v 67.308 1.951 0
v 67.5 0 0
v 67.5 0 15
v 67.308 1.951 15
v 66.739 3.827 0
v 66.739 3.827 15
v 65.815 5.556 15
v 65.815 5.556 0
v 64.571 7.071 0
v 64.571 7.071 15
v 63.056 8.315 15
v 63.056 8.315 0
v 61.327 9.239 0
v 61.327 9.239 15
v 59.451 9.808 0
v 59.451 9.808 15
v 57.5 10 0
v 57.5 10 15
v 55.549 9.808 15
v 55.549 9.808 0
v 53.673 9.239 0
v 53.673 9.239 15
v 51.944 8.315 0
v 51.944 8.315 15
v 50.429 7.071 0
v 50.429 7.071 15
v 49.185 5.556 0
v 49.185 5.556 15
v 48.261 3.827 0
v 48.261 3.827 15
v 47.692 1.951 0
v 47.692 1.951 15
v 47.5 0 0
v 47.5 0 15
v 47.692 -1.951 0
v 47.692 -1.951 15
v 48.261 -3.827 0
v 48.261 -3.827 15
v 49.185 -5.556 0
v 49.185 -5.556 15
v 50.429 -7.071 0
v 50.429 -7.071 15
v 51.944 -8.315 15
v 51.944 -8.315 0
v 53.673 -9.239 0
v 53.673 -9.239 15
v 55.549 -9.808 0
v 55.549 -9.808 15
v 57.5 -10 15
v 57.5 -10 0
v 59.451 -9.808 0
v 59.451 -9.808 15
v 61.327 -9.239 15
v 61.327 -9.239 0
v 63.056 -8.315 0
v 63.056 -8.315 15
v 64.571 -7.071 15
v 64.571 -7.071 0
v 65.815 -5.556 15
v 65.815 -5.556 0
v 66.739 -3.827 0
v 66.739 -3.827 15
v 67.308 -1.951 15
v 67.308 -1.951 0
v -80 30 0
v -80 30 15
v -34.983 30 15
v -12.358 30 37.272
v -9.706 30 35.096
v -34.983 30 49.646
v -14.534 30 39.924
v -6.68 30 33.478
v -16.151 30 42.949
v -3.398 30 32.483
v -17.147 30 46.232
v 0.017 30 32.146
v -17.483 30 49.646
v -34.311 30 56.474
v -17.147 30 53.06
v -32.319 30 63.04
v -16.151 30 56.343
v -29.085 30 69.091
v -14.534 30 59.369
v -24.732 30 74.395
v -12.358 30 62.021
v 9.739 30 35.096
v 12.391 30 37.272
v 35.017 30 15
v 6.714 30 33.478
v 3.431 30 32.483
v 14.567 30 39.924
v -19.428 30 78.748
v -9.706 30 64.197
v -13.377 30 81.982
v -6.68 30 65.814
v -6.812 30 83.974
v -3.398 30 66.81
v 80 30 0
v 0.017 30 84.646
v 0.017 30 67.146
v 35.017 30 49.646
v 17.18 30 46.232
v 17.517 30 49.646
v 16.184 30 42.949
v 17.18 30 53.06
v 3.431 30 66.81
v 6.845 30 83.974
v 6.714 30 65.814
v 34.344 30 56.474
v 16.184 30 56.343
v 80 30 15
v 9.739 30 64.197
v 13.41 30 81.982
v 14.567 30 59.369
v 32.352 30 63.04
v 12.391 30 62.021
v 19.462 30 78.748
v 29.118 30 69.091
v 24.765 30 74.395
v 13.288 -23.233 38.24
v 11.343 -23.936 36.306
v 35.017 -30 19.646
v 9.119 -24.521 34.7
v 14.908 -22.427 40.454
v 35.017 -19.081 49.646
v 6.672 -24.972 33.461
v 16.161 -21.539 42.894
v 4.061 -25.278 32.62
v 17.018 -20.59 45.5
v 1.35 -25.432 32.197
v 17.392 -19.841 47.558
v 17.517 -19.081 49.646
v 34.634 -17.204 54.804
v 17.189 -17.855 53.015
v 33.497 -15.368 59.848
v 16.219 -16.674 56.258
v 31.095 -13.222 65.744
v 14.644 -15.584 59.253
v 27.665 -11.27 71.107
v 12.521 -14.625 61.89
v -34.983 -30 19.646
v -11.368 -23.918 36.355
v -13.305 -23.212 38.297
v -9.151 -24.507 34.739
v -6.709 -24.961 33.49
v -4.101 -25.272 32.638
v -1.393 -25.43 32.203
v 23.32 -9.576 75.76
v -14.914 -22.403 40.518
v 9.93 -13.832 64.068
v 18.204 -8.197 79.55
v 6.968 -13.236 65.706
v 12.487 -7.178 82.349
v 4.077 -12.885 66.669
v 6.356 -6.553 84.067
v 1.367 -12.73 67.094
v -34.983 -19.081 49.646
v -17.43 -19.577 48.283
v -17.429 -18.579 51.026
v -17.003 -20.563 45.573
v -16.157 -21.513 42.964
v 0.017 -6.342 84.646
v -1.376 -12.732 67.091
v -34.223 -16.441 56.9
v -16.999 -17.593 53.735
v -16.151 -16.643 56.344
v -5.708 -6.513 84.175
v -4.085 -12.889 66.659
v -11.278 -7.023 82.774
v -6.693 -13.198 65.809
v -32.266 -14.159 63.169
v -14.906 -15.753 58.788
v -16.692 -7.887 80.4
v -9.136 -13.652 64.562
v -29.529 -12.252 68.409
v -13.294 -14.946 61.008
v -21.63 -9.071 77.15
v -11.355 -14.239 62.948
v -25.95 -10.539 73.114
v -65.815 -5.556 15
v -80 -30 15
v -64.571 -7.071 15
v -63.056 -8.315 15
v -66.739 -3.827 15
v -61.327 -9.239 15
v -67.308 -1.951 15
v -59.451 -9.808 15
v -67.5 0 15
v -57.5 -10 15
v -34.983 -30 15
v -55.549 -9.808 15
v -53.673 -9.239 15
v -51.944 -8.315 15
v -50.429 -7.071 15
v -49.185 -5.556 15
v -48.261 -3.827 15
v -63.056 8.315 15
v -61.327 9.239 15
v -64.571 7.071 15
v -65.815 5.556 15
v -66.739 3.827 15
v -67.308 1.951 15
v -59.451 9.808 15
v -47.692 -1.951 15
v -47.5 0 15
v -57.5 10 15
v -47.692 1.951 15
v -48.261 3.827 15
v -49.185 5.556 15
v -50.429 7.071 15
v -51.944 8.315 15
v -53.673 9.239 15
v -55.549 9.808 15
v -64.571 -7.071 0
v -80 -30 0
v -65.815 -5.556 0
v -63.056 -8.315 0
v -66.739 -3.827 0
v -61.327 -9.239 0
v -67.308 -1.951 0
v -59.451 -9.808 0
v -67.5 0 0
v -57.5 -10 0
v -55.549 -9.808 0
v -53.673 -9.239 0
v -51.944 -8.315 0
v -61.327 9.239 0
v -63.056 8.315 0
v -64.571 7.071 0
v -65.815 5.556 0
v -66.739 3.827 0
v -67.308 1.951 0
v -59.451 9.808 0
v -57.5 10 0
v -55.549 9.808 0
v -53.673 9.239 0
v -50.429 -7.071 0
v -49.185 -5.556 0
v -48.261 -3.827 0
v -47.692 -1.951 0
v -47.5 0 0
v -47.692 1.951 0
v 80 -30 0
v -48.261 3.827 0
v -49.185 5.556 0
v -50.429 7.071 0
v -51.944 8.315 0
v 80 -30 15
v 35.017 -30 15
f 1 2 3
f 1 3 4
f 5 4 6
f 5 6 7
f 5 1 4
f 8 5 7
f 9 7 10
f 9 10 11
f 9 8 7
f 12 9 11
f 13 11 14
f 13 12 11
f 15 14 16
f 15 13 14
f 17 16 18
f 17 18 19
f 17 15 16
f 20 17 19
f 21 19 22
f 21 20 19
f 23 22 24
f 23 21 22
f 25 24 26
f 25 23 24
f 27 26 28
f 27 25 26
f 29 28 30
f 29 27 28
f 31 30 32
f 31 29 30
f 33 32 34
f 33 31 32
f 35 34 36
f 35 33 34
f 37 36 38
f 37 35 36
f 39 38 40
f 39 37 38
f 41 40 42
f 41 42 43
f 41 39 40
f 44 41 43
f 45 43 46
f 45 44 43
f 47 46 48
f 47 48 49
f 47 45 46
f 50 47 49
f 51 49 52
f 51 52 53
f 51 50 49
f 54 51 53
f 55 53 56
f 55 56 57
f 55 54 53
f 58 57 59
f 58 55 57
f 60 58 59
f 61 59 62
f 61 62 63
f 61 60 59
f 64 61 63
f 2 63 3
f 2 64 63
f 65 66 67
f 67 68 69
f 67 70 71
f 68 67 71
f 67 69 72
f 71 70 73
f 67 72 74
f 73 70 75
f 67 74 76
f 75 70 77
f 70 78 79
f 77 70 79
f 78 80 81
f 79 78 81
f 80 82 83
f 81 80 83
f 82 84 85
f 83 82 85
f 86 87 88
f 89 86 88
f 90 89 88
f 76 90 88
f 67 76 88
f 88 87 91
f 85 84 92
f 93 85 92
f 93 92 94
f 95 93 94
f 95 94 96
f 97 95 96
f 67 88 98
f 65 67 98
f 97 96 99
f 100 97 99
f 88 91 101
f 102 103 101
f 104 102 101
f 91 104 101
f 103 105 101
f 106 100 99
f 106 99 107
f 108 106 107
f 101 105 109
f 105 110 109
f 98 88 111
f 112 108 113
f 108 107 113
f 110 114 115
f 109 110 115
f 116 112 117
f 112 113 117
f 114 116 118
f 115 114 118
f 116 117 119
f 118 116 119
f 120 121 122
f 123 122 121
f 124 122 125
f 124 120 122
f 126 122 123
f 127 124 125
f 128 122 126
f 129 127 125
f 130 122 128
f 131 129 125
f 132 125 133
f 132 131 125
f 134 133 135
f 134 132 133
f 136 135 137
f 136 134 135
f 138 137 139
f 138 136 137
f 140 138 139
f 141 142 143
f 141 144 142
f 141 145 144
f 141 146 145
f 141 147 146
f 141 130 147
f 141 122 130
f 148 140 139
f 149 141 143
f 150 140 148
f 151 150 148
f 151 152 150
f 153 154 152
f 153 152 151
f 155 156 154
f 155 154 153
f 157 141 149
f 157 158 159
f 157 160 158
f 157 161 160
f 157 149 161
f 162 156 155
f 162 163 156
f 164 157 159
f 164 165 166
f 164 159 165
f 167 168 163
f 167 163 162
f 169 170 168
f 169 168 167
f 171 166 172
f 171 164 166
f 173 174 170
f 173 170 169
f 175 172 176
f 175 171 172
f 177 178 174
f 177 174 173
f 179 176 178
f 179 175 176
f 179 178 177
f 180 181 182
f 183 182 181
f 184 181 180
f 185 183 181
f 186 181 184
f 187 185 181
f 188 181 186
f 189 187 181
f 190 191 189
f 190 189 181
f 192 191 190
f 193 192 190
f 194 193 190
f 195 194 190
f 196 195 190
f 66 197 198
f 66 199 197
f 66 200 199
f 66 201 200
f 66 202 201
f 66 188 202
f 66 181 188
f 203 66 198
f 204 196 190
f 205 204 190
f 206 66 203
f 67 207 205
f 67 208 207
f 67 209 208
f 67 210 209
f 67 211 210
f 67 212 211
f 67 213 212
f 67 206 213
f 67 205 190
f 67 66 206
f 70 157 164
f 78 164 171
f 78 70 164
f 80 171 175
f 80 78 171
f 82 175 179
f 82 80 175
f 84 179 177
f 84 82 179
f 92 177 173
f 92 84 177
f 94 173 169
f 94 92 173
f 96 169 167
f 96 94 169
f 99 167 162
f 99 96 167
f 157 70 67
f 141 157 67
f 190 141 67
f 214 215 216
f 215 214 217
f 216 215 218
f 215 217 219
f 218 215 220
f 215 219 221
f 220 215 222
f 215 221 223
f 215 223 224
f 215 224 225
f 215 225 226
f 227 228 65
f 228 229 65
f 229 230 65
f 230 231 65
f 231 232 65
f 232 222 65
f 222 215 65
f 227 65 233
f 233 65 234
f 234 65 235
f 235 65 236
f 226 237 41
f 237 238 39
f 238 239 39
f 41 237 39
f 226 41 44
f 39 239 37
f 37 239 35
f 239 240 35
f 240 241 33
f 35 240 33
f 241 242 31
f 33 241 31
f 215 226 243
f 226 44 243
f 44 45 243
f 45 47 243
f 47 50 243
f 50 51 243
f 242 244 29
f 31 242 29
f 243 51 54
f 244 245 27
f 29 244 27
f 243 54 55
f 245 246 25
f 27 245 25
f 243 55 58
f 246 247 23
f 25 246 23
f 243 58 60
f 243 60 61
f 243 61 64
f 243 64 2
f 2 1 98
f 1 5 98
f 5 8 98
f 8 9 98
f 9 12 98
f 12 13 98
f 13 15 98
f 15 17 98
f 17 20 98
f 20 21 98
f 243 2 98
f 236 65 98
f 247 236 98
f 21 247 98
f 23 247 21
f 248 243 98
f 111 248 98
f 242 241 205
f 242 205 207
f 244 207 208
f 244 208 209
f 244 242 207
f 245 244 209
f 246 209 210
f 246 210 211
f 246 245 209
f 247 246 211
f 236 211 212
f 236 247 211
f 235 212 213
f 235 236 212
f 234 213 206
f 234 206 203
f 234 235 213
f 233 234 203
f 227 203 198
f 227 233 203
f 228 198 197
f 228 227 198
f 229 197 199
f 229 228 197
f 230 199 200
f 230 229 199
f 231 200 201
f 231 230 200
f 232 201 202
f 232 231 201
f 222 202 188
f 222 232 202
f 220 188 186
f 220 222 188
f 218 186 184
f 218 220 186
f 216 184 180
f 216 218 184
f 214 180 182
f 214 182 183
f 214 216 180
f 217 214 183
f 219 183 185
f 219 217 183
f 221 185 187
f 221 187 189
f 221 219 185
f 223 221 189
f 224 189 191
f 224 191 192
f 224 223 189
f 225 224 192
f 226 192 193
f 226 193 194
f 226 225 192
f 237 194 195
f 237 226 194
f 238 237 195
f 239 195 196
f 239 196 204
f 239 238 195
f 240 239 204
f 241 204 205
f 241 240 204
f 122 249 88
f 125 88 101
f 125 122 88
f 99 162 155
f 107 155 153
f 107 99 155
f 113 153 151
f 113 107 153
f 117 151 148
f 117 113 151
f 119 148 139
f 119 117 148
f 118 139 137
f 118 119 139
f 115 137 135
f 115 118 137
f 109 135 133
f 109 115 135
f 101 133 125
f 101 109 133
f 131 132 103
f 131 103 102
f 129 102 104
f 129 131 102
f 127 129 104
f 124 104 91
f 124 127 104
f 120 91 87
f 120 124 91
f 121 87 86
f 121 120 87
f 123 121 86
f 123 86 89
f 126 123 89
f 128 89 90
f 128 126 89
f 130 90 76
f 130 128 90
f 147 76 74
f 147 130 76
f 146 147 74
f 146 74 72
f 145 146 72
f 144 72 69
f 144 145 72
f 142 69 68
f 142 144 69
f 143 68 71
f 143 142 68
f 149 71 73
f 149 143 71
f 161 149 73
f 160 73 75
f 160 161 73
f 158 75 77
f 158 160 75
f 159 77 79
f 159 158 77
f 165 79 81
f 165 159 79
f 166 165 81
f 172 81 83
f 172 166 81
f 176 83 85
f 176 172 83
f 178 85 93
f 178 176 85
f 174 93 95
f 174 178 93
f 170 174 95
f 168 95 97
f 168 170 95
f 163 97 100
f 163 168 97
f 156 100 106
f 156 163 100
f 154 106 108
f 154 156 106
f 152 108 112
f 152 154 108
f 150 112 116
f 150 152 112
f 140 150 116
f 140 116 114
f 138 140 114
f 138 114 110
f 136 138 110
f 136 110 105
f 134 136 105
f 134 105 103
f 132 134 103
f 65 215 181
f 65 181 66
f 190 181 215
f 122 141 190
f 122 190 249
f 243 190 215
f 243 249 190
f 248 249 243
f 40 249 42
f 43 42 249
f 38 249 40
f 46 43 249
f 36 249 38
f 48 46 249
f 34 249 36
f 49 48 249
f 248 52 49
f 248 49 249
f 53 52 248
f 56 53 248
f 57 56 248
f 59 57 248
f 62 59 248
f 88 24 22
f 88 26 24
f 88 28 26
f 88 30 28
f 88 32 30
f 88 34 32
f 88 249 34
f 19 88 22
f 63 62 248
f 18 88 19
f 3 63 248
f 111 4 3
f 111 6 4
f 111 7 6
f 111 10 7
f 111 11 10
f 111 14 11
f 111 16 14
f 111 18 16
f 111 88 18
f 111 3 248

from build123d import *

# Parameters (mm, degrees)
F0_W          = 160
F0_H          = 60
F0_R          = 10
F1_DEPTH      = 15
F3_DEPTH      = 30
F3_DEPTH_BACK = 30
F4_T1_DEPTH   = 407.2453152316
F5_R          = 34.99999


# Not quite as in the source:
# - a fillet or chamfer that OpenCascade refuses, or shapes differently, is made with other operations: its cross-section is extruded or revolved along the edge and cut away or added
# - a fillet or chamfer is up to 0.001 mm smaller than in the source, because OpenCascade refuses the exact size


with BuildPart() as f1:
    # F0 (on Top) → F1 (new body)
    with BuildSketch(Plane.XY):
        Rectangle(F0_W, F0_H)
        with Locations((-57.5, 0)):
            Circle(F0_R, mode=Mode.SUBTRACT)
        with Locations((57.5, 0)):
            Circle(F0_R, mode=Mode.SUBTRACT)
    extrude(amount=F1_DEPTH)

    # F2 (on Front) → F3 (join, two sides)
    with BuildSketch(Plane.XZ) as f3_sk:
        with BuildLine():
            Line((35.0165497145, 49.646243304), (17.5165497145, 49.646243304))
            ThreePointArc((17.5165497145, 49.646243304), (0.0165497145, 32.146243304), (-17.4834502855, 49.646243304))
            Line((-17.4834502855, 49.646243304), (-34.9834502855, 49.646243304))
            Line((-34.9834502855, 49.646243304), (-34.9834502855, 14.646243304))
            Line((-34.9834502855, 14.646243304), (35.0165497145, 14.646243304))
            Line((35.0165497145, 14.646243304), (35.0165497145, 49.646243304))
        make_face()
        with BuildLine():
            ThreePointArc((-17.4834502855, 49.646243304), (0.0165497145, 67.146243304), (17.5165497145, 49.646243304))
            Line((17.5165497145, 49.646243304), (35.0165497145, 49.646243304))
            Line((35.0165497145, 49.646243304), (35.0165497145, 54.9693842517))
            Line((35.0165497145, 54.9693842517), (35.0165497145, 84.646243304))
            Line((35.0165497145, 84.646243304), (-34.9834502855, 84.646243304))
            Line((-34.9834502855, 84.646243304), (-34.9834502855, 49.646243304))
            Line((-34.9834502855, 49.646243304), (-17.4834502855, 49.646243304))
        make_face()
    extrude(amount=F3_DEPTH)
    extrude(f3_sk.sketch, amount=-F3_DEPTH_BACK)

    # F4: chamfer of 65 x 23.6580652273 on 1 edges, made by hand

    # F4_s2 → F4_t1 (cut)
    with BuildSketch(Plane.YZ.offset(-203.6061079013)):
        Polygon((-30, 19.646243304), (-6.3419347727, 84.646243304), (-30, 84.646243304), align=None)
    extrude(amount=F4_T1_DEPTH, mode=Mode.SUBTRACT)

    # F5 (radius 35 in the source; OpenCascade refuses exactly that, so slightly less here)
    f5_edges = [f1.edges().sort_by_distance(p)[0] for p in [
        (35.01655, 11.829033, 84.646243),
        (-34.98345, 11.829033, 84.646243),
    ]]
    fillet(f5_edges, radius=F5_R)


solid = f1.part
